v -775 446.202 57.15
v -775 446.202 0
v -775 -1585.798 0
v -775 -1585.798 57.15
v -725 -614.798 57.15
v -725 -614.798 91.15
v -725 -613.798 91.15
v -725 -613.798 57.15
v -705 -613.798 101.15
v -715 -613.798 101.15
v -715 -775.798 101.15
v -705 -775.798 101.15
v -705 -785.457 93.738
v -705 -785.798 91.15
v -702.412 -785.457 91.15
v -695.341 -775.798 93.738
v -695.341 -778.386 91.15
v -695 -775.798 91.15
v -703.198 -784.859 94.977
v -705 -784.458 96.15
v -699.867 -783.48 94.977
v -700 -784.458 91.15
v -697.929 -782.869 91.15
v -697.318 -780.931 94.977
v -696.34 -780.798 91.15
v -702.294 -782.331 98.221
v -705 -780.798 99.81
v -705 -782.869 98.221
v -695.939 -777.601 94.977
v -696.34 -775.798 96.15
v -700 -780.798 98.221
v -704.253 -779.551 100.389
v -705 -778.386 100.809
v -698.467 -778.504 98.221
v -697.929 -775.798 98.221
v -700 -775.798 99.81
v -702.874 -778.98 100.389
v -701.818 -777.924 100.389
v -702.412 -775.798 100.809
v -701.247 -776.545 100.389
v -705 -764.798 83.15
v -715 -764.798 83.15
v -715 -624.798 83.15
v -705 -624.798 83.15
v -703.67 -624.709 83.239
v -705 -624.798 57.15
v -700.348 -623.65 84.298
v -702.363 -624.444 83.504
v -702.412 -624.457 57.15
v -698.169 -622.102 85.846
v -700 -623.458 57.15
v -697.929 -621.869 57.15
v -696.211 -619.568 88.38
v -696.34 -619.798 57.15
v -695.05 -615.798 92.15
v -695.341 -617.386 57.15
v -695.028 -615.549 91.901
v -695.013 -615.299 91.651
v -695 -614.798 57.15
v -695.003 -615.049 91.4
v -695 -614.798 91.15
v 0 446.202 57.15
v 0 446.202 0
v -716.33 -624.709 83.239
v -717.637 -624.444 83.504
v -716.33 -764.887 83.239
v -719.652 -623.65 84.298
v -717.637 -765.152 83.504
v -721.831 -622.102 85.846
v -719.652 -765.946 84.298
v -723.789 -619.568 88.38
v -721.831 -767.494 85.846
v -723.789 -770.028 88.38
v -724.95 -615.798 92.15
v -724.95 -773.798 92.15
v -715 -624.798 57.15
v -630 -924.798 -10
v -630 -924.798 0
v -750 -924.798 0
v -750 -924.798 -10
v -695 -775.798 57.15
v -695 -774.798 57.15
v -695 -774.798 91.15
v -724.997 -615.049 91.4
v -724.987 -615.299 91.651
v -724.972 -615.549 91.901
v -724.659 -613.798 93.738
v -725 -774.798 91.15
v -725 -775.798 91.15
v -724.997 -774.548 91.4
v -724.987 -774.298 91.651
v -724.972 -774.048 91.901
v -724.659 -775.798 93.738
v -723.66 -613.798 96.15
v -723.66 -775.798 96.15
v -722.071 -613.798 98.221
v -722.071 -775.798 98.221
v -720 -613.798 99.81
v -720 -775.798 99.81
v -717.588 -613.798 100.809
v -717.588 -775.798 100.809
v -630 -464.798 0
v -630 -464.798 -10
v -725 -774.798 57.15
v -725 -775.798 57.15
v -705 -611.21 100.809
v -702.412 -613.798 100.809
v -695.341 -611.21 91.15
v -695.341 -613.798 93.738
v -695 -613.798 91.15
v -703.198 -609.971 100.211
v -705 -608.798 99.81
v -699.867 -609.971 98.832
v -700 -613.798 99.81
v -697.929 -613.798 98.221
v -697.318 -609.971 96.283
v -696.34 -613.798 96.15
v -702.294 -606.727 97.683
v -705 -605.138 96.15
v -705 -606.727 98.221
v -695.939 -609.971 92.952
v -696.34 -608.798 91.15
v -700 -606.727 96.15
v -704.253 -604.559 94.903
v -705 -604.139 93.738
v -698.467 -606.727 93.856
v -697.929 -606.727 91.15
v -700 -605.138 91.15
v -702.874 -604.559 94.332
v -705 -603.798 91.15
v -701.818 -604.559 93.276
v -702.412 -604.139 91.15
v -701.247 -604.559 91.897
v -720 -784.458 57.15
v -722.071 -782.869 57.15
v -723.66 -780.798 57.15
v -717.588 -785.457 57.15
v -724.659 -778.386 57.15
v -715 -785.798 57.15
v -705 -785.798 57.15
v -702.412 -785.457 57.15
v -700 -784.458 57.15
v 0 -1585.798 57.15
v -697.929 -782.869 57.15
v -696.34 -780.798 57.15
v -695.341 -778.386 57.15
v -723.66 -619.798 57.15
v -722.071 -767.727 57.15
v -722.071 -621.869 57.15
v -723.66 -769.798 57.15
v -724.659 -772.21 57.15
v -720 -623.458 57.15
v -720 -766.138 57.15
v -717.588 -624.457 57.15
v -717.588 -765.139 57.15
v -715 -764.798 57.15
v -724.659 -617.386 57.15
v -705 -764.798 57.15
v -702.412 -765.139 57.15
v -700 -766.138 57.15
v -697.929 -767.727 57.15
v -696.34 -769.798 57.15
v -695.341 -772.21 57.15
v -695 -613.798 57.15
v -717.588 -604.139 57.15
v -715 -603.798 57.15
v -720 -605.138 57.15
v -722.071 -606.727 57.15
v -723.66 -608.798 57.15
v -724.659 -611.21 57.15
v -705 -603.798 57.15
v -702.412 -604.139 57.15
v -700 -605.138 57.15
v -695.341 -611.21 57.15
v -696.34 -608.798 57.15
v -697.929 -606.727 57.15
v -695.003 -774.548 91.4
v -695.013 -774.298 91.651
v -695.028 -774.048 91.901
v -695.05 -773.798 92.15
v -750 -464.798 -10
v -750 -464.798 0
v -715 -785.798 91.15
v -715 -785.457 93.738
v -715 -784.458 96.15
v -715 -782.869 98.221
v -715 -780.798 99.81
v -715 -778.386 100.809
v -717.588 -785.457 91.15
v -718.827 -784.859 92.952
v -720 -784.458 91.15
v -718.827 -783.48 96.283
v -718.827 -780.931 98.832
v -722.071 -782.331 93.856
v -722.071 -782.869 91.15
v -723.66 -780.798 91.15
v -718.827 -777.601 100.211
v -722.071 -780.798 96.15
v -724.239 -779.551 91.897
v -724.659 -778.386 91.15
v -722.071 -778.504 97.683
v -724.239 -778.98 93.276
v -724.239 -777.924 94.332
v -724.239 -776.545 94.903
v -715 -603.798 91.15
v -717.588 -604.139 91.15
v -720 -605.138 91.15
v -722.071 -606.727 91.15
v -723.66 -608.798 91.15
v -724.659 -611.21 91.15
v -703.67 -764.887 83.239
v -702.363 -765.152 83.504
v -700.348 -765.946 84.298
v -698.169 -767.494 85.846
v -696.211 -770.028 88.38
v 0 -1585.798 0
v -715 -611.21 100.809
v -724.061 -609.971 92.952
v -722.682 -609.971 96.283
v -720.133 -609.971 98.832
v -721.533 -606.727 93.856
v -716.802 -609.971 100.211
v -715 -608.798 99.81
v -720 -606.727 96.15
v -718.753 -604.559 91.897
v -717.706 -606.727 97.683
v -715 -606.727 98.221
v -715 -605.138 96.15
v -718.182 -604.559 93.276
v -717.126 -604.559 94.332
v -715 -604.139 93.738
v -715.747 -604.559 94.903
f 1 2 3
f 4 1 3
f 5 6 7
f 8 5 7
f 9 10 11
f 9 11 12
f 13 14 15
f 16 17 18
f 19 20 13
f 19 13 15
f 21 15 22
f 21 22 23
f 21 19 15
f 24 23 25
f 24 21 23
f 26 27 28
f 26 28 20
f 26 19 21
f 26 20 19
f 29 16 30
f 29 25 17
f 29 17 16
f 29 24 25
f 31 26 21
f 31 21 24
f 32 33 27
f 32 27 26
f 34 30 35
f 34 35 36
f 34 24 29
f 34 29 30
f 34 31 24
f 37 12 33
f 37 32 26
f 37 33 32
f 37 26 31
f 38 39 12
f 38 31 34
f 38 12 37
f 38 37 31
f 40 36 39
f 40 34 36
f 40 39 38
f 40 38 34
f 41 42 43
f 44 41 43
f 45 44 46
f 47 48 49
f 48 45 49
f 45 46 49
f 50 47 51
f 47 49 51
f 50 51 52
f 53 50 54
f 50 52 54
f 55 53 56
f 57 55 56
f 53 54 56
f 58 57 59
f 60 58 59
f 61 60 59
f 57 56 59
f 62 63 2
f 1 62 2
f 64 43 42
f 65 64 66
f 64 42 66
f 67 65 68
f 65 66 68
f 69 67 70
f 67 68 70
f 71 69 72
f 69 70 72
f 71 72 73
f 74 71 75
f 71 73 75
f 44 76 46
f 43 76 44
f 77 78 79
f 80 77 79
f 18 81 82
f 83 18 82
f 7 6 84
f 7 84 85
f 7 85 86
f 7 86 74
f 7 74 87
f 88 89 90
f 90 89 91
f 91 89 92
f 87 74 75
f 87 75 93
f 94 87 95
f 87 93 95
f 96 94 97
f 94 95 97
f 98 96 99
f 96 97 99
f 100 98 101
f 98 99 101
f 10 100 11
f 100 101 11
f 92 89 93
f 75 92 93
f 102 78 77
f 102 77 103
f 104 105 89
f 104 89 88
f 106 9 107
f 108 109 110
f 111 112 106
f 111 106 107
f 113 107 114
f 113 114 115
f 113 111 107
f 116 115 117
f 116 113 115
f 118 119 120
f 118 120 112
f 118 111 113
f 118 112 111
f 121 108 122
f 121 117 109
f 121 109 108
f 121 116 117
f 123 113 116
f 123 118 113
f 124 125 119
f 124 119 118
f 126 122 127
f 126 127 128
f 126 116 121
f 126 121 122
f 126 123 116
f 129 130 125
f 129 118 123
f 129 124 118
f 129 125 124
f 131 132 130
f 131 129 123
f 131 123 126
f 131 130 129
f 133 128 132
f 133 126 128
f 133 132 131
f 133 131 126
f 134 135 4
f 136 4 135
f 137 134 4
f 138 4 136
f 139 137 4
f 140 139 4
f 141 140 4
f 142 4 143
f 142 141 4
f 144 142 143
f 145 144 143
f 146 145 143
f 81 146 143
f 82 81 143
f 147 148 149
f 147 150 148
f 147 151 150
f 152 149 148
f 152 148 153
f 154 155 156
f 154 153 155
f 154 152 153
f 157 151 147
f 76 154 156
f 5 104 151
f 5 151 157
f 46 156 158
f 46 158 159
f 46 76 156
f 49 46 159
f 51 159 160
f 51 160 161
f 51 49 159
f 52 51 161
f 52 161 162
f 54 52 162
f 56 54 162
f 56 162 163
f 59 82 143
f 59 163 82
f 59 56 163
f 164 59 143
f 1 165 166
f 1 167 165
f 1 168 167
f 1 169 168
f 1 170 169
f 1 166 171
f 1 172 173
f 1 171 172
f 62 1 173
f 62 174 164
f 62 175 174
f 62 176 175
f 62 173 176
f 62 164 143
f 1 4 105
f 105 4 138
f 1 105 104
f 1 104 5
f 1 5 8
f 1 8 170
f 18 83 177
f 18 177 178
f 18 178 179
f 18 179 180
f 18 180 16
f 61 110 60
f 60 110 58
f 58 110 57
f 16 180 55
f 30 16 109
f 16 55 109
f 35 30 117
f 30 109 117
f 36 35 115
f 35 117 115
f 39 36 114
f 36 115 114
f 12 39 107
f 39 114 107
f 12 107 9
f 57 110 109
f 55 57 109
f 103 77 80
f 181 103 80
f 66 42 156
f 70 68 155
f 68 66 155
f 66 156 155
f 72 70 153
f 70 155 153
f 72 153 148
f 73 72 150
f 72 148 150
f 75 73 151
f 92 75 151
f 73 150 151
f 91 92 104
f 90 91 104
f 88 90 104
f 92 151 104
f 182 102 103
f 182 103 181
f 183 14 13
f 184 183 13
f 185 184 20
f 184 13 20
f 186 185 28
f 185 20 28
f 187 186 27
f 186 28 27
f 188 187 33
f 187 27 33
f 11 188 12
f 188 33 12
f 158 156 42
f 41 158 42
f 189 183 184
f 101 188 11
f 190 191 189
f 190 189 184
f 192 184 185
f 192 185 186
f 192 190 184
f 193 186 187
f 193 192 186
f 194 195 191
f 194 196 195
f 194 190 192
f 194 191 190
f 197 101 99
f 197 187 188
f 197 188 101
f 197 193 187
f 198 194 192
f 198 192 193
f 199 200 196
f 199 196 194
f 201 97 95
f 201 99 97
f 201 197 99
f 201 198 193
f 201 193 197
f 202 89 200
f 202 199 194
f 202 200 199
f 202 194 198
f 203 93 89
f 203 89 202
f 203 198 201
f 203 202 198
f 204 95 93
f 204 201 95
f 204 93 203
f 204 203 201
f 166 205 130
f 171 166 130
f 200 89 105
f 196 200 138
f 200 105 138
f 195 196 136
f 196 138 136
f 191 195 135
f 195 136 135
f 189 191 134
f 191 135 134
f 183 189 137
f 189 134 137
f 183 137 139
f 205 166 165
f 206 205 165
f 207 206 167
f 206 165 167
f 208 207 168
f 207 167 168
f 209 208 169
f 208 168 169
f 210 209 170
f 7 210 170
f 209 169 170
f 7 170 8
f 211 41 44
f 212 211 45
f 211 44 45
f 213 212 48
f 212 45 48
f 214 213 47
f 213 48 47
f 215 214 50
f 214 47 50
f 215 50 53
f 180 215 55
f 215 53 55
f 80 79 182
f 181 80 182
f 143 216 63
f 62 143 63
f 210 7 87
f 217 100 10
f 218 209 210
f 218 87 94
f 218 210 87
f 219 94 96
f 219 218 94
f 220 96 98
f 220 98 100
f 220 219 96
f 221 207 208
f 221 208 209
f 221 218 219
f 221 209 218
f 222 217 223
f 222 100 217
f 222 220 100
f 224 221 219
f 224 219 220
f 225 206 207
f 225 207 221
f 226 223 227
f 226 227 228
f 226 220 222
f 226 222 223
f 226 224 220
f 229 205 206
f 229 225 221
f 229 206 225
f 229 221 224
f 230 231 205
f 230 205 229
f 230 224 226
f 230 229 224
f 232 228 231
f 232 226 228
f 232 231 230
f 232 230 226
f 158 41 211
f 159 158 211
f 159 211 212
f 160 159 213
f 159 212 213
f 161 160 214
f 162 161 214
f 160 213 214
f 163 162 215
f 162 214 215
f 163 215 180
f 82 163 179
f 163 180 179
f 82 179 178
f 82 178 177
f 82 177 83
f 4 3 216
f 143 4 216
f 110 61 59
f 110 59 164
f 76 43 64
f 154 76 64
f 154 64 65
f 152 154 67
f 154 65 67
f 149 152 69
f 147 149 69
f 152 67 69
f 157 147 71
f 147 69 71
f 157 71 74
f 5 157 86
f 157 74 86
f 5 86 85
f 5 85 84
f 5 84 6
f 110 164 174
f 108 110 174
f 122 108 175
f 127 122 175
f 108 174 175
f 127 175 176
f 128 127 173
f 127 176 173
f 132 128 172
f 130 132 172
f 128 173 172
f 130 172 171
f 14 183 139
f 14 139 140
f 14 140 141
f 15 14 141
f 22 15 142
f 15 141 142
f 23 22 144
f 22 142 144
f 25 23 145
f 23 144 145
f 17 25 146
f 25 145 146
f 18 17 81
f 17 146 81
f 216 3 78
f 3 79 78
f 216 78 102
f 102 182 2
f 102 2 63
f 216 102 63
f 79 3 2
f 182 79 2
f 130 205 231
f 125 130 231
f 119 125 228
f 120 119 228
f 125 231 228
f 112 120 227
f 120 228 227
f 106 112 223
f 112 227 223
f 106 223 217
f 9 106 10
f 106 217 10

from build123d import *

# Parameters (mm, degrees)
BOSS_EXTRUDE2_DEPTH = 57.15
SKETCH4_W           = 30
SKETCH4_H           = 182
BOSS_EXTRUDE3_DEPTH = 44
SKETCH5_W           = 26
SKETCH5_H           = 140
CUT_EXTRUDE1_DEPTH  = 57.15
FILLET1_R           = 10
SKETCH6_W           = 120
SKETCH6_H           = 460
BOSS_EXTRUDE4_DEPTH = 10


with BuildPart() as part:
    # Sketch1 → Boss-Extrude2 (new body)
    with BuildSketch(Plane.XY):
        Polygon((0, 0), (0, 446.201837212), (-775, 446.201837212), (-775, -1585.798162788), (0, -1585.798162788), align=None)
    extrude(amount=BOSS_EXTRUDE2_DEPTH)

    # Sketch4 → Boss-Extrude3 (add)
    with BuildSketch(Plane.XY.offset(57.15)):
        with Locations((-710, -694.798162788)):
            Rectangle(SKETCH4_W, SKETCH4_H)
    extrude(amount=BOSS_EXTRUDE3_DEPTH)

    # Sketch5 → Cut-Extrude1 (cut)
    with BuildSketch(Plane.ZY.offset(725)):
        with Locations((70.15, -694.798162788)):
            Rectangle(SKETCH5_W, SKETCH5_H)
    extrude(amount=-CUT_EXTRUDE1_DEPTH, mode=Mode.SUBTRACT)

    # Fillet1
    # the kernel refuses this fillet: 10 mm, written as the material it takes off along each edge
    with BuildSketch(Plane(origin=(-715, -613.798162788, 91.15), x_dir=(-1, 0, 0), z_dir=(0, 1, 0))) as fillet1_piece_1_section:
        Polygon((0, 0), (FILLET1_R * 1.02, 0), (FILLET1_R * 1.02, FILLET1_R * 1.02), (0, FILLET1_R * 1.02), align=None)
    fillet1_piece_1 = extrude(amount=FILLET1_R * 1.02, mode=Mode.PRIVATE)
    fillet1_piece_1 = fillet1_piece_1 - Plane(origin=(-715, -613.798162788, 91.15), x_dir=(0.7071067811865475, 0, -0.7071067811865475), z_dir=(0, 1, 0)) * Sphere(FILLET1_R, mode=Mode.PRIVATE)
    add(fillet1_piece_1, mode=Mode.SUBTRACT)
    with BuildSketch(Plane(origin=(-715, -775.798162788, 91.15), x_dir=(0, 0, 1), z_dir=(-1, 0, 0))) as fillet1_piece_2_section:
        Polygon((0, 0), (FILLET1_R * 1.02, 0), (FILLET1_R * 1.02, -FILLET1_R * 1.02), (0, -FILLET1_R * 1.02), align=None)
    fillet1_piece_2 = extrude(amount=FILLET1_R * 1.02, mode=Mode.PRIVATE)
    fillet1_piece_2 = fillet1_piece_2 - Plane(origin=(-715, -775.798162788, 91.15), x_dir=(0, 0.7071067811865475, -0.7071067811865475), z_dir=(-1, 0, 0)) * Sphere(FILLET1_R, mode=Mode.PRIVATE)
    add(fillet1_piece_2, mode=Mode.SUBTRACT)
    with BuildSketch(Plane(origin=(-705, -775.798162788, 91.15), x_dir=(0, -1, 0), z_dir=(0, 0, 1))) as fillet1_piece_3_section:
        Polygon((0, 0), (FILLET1_R * 1.02, 0), (FILLET1_R * 1.02, FILLET1_R * 1.02), (0, FILLET1_R * 1.02), align=None)
    fillet1_piece_3 = extrude(amount=FILLET1_R * 1.02, mode=Mode.PRIVATE)
    fillet1_piece_3 = fillet1_piece_3 - Plane(origin=(-705, -775.798162788, 91.15), x_dir=(-0.7071067811865472, 0.7071067811865477, 0), z_dir=(0, 0, 1)) * Sphere(FILLET1_R, mode=Mode.PRIVATE)
    add(fillet1_piece_3, mode=Mode.SUBTRACT)
    with BuildSketch(Plane(origin=(-705, -613.798162788, 91.15), x_dir=(0, 0, 1), z_dir=(0, 1, 0))) as fillet1_piece_4_section:
        Polygon((0, 0), (FILLET1_R * 1.02, 0), (FILLET1_R * 1.02, FILLET1_R * 1.02), (0, FILLET1_R * 1.02), align=None)
    fillet1_piece_4 = extrude(amount=FILLET1_R * 1.02, mode=Mode.PRIVATE)
    fillet1_piece_4 = fillet1_piece_4 - Plane(origin=(-705, -613.798162788, 91.15), x_dir=(-0.7071067811865475, 0, -0.7071067811865475), z_dir=(0, 1, 0)) * Sphere(FILLET1_R, mode=Mode.PRIVATE)
    add(fillet1_piece_4, mode=Mode.SUBTRACT)
    with BuildSketch(Plane(origin=(-725, -603.798162788, 57.15), x_dir=(1, 0, 0), z_dir=(0, 0, 1)), Plane(origin=(-695, -785.798162788, 57.15), x_dir=(-1, 0, 0), z_dir=(0, 0, 1)), Plane(origin=(-695, -603.798162788, 57.15), x_dir=(0, -1, 0), z_dir=(0, 0, 1))) as fillet1_piece_5:
        with BuildLine():
            CenterArc((FILLET1_R, -FILLET1_R), FILLET1_R, 90, 90)
            Line((0, -FILLET1_R), (-FILLET1_R * 0.02, -FILLET1_R))
            Line((-FILLET1_R * 0.02, -FILLET1_R), (-FILLET1_R * 0.02, FILLET1_R * 0.02))
            Line((-FILLET1_R * 0.02, FILLET1_R * 0.02), (FILLET1_R, FILLET1_R * 0.02))
            Line((FILLET1_R, FILLET1_R * 0.02), (FILLET1_R, 0))
        make_face()
    extrude(amount=34, mode=Mode.SUBTRACT)
    with BuildSketch(Plane(origin=(-725, -785.798162788, 57.15), x_dir=(1, 0, 0), z_dir=(0, 0, 1))) as fillet1_piece_6:
        with BuildLine():
            CenterArc((FILLET1_R, FILLET1_R), FILLET1_R, 180, 90)
            Line((0, FILLET1_R), (-FILLET1_R * 0.02, FILLET1_R))
            Line((-FILLET1_R * 0.02, FILLET1_R), (-FILLET1_R * 0.02, -FILLET1_R * 0.02))
            Line((-FILLET1_R * 0.02, -FILLET1_R * 0.02), (FILLET1_R, -FILLET1_R * 0.02))
            Line((FILLET1_R, -FILLET1_R * 0.02), (FILLET1_R, 0))
        make_face()
    extrude(amount=34, mode=Mode.SUBTRACT)
    with BuildSketch(Plane(origin=(-725, -775.798162788, 101.15), x_dir=(0, 0, -1), z_dir=(0, 1, 0)), Plane(origin=(-695, -613.798162788, 101.15), x_dir=(0, 0, -1), z_dir=(0, -1, 0))) as fillet1_piece_7:
        with BuildLine():
            CenterArc((FILLET1_R, -FILLET1_R), FILLET1_R, 90, 90)
            Line((0, -FILLET1_R), (-FILLET1_R * 0.02, -FILLET1_R))
            Line((-FILLET1_R * 0.02, -FILLET1_R), (-FILLET1_R * 0.02, FILLET1_R * 0.02))
            Line((-FILLET1_R * 0.02, FILLET1_R * 0.02), (FILLET1_R, FILLET1_R * 0.02))
            Line((FILLET1_R, FILLET1_R * 0.02), (FILLET1_R, 0))
        make_face()
    extrude(amount=162, mode=Mode.SUBTRACT)
    with BuildSketch(Plane(origin=(-705, -785.798162788, 101.15), x_dir=(0, 0, -1), z_dir=(-1, 0, 0)), Plane(origin=(-715, -603.798162788, 101.15), x_dir=(0, 0, -1), z_dir=(1, 0, 0))) as fillet1_piece_8:
        with BuildLine():
            CenterArc((FILLET1_R, -FILLET1_R), FILLET1_R, 90, 90)
            Line((0, -FILLET1_R), (-FILLET1_R * 0.02, -FILLET1_R))
            Line((-FILLET1_R * 0.02, -FILLET1_R), (-FILLET1_R * 0.02, FILLET1_R * 0.02))
            Line((-FILLET1_R * 0.02, FILLET1_R * 0.02), (FILLET1_R, FILLET1_R * 0.02))
            Line((FILLET1_R, FILLET1_R * 0.02), (FILLET1_R, 0))
        make_face()
    extrude(amount=10, mode=Mode.SUBTRACT)
    with BuildSketch(Plane(origin=(-695, -764.798162788, 83.15), x_dir=(0, -1, 0), z_dir=(0, 0, -1)), Plane(origin=(-695, -624.798162788, 57.15), x_dir=(0, 1, 0), z_dir=(0, 0, 1)), Plane(origin=(-725, -764.798162788, 57.15), x_dir=(0, -1, 0), z_dir=(0, 0, 1)), Plane(origin=(-725, -624.798162788, 83.15), x_dir=(0, 1, 0), z_dir=(0, 0, -1))) as fillet1_piece_9:
        with BuildLine():
            CenterArc((FILLET1_R, FILLET1_R), FILLET1_R, 180, 90)
            Line((0, FILLET1_R), (-FILLET1_R * 0.02, FILLET1_R))
            Line((-FILLET1_R * 0.02, FILLET1_R), (-FILLET1_R * 0.02, -FILLET1_R * 0.02))
            Line((-FILLET1_R * 0.02, -FILLET1_R * 0.02), (FILLET1_R, -FILLET1_R * 0.02))
            Line((FILLET1_R, -FILLET1_R * 0.02), (FILLET1_R, 0))
        make_face()
    extrude(amount=26, mode=Mode.SUBTRACT)
    with BuildSketch(Plane(origin=(-695, -624.798162788, 83.15), x_dir=(0, 0, 1), z_dir=(0, -1, 0)), Plane(origin=(-725, -764.798162788, 83.15), x_dir=(0, 0, 1), z_dir=(0, 1, 0))) as fillet1_piece_10:
        with BuildLine():
            CenterArc((FILLET1_R, FILLET1_R), FILLET1_R, 180, 90)
            Line((0, FILLET1_R), (-FILLET1_R * 0.02, FILLET1_R))
            Line((-FILLET1_R * 0.02, FILLET1_R), (-FILLET1_R * 0.02, -FILLET1_R * 0.02))
            Line((-FILLET1_R * 0.02, -FILLET1_R * 0.02), (FILLET1_R, -FILLET1_R * 0.02))
            Line((FILLET1_R, -FILLET1_R * 0.02), (FILLET1_R, 0))
        make_face()
    extrude(amount=140, mode=Mode.SUBTRACT)
    with BuildSketch(Plane(origin=(-695, -624.798162788, 83.15), x_dir=(0, 0, 1), z_dir=(0, -1, 0))) as fillet1_piece_11a_section:
        with BuildLine():
            CenterArc((FILLET1_R, FILLET1_R), FILLET1_R, 180, 90)
            Line((0, FILLET1_R), (-FILLET1_R * 0.02, FILLET1_R))
            Line((-FILLET1_R * 0.02, FILLET1_R), (-FILLET1_R * 0.02, -FILLET1_R * 0.02))
            Line((-FILLET1_R * 0.02, -FILLET1_R * 0.02), (FILLET1_R, -FILLET1_R * 0.02))
            Line((FILLET1_R, -FILLET1_R * 0.02), (FILLET1_R, 0))
        make_face()
    fillet1_piece_11a = extrude(amount=165, mode=Mode.PRIVATE)
    fillet1_piece_11a = split(fillet1_piece_11a, bisect_by=Plane(origin=(-697.263951143, -764.798162788, 85.413951143), z_dir=(0, -1, 0)), keep=Keep.TOP, mode=Mode.PRIVATE)
    with BuildSketch(Plane(origin=(-695, -764.798162788, 108.15), x_dir=(0, -1, 0), z_dir=(0, 0, -1))) as fillet1_piece_11b_section:
        with BuildLine():
            CenterArc((FILLET1_R, FILLET1_R), FILLET1_R, 180, 90)
            Line((0, FILLET1_R), (-FILLET1_R * 0.02, FILLET1_R))
            Line((-FILLET1_R * 0.02, FILLET1_R), (-FILLET1_R * 0.02, -FILLET1_R * 0.02))
            Line((-FILLET1_R * 0.02, -FILLET1_R * 0.02), (FILLET1_R, -FILLET1_R * 0.02))
            Line((FILLET1_R, -FILLET1_R * 0.02), (FILLET1_R, 0))
        make_face()
    fillet1_piece_11b = extrude(amount=51, mode=Mode.PRIVATE)
    fillet1_piece_11b = split(fillet1_piece_11b, bisect_by=Plane(origin=(-697.263951143, -767.062113931, 83.15), z_dir=(0, 0, 1)), keep=Keep.TOP, mode=Mode.PRIVATE)
    fillet1_piece_11 = fillet1_piece_11a & fillet1_piece_11b
    add(fillet1_piece_11, mode=Mode.SUBTRACT)
    with BuildSketch(Plane(origin=(-695, -624.798162788, 57.15), x_dir=(0, 1, 0), z_dir=(0, 0, 1))) as fillet1_piece_12a_section:
        with BuildLine():
            CenterArc((FILLET1_R, FILLET1_R), FILLET1_R, 180, 90)
            Line((0, FILLET1_R), (-FILLET1_R * 0.02, FILLET1_R))
            Line((-FILLET1_R * 0.02, FILLET1_R), (-FILLET1_R * 0.02, -FILLET1_R * 0.02))
            Line((-FILLET1_R * 0.02, -FILLET1_R * 0.02), (FILLET1_R, -FILLET1_R * 0.02))
            Line((FILLET1_R, -FILLET1_R * 0.02), (FILLET1_R, 0))
        make_face()
    fillet1_piece_12a = extrude(amount=51, mode=Mode.PRIVATE)
    fillet1_piece_12a = split(fillet1_piece_12a, bisect_by=Plane(origin=(-697.263951143, -622.534211645, 83.15), z_dir=(0, 0, 1)), keep=Keep.TOP, mode=Mode.PRIVATE)
    with BuildSketch(Plane(origin=(-695, -599.798162788, 83.15), x_dir=(0, 0, 1), z_dir=(0, -1, 0))) as fillet1_piece_12b_section:
        with BuildLine():
            CenterArc((FILLET1_R, FILLET1_R), FILLET1_R, 180, 90)
            Line((0, FILLET1_R), (-FILLET1_R * 0.02, FILLET1_R))
            Line((-FILLET1_R * 0.02, FILLET1_R), (-FILLET1_R * 0.02, -FILLET1_R * 0.02))
            Line((-FILLET1_R * 0.02, -FILLET1_R * 0.02), (FILLET1_R, -FILLET1_R * 0.02))
            Line((FILLET1_R, -FILLET1_R * 0.02), (FILLET1_R, 0))
        make_face()
    fillet1_piece_12b = extrude(amount=165, mode=Mode.PRIVATE)
    fillet1_piece_12b = split(fillet1_piece_12b, bisect_by=Plane(origin=(-697.263951143, -624.798162788, 85.413951143), z_dir=(0, 1, 0)), keep=Keep.TOP, mode=Mode.PRIVATE)
    fillet1_piece_12 = fillet1_piece_12a & fillet1_piece_12b
    add(fillet1_piece_12, mode=Mode.SUBTRACT)
    with BuildSketch(Plane(origin=(-725, -764.798162788, 57.15), x_dir=(0, -1, 0), z_dir=(0, 0, 1))) as fillet1_piece_13a_section:
        with BuildLine():
            CenterArc((FILLET1_R, FILLET1_R), FILLET1_R, 180, 90)
            Line((0, FILLET1_R), (-FILLET1_R * 0.02, FILLET1_R))
            Line((-FILLET1_R * 0.02, FILLET1_R), (-FILLET1_R * 0.02, -FILLET1_R * 0.02))
            Line((-FILLET1_R * 0.02, -FILLET1_R * 0.02), (FILLET1_R, -FILLET1_R * 0.02))
            Line((FILLET1_R, -FILLET1_R * 0.02), (FILLET1_R, 0))
        make_face()
    fillet1_piece_13a = extrude(amount=51, mode=Mode.PRIVATE)
    fillet1_piece_13a = split(fillet1_piece_13a, bisect_by=Plane(origin=(-722.736048857, -767.062113931, 83.15), z_dir=(0, 0, 1)), keep=Keep.TOP, mode=Mode.PRIVATE)
    with BuildSketch(Plane(origin=(-725, -789.798162788, 83.15), x_dir=(0, 0, 1), z_dir=(0, 1, 0))) as fillet1_piece_13b_section:
        with BuildLine():
            CenterArc((FILLET1_R, FILLET1_R), FILLET1_R, 180, 90)
            Line((0, FILLET1_R), (-FILLET1_R * 0.02, FILLET1_R))
            Line((-FILLET1_R * 0.02, FILLET1_R), (-FILLET1_R * 0.02, -FILLET1_R * 0.02))
            Line((-FILLET1_R * 0.02, -FILLET1_R * 0.02), (FILLET1_R, -FILLET1_R * 0.02))
            Line((FILLET1_R, -FILLET1_R * 0.02), (FILLET1_R, 0))
        make_face()
    fillet1_piece_13b = extrude(amount=165, mode=Mode.PRIVATE)
    fillet1_piece_13b = split(fillet1_piece_13b, bisect_by=Plane(origin=(-722.736048857, -764.798162788, 85.413951143), z_dir=(0, -1, 0)), keep=Keep.TOP, mode=Mode.PRIVATE)
    fillet1_piece_13 = fillet1_piece_13a & fillet1_piece_13b
    add(fillet1_piece_13, mode=Mode.SUBTRACT)
    with BuildSketch(Plane(origin=(-725, -764.798162788, 83.15), x_dir=(0, 0, 1), z_dir=(0, 1, 0))) as fillet1_piece_14a_section:
        with BuildLine():
            CenterArc((FILLET1_R, FILLET1_R), FILLET1_R, 180, 90)
            Line((0, FILLET1_R), (-FILLET1_R * 0.02, FILLET1_R))
            Line((-FILLET1_R * 0.02, FILLET1_R), (-FILLET1_R * 0.02, -FILLET1_R * 0.02))
            Line((-FILLET1_R * 0.02, -FILLET1_R * 0.02), (FILLET1_R, -FILLET1_R * 0.02))
            Line((FILLET1_R, -FILLET1_R * 0.02), (FILLET1_R, 0))
        make_face()
    fillet1_piece_14a = extrude(amount=165, mode=Mode.PRIVATE)
    fillet1_piece_14a = split(fillet1_piece_14a, bisect_by=Plane(origin=(-722.736048857, -624.798162788, 85.413951143), z_dir=(0, 1, 0)), keep=Keep.TOP, mode=Mode.PRIVATE)
    with BuildSketch(Plane(origin=(-725, -624.798162788, 108.15), x_dir=(0, 1, 0), z_dir=(0, 0, -1))) as fillet1_piece_14b_section:
        with BuildLine():
            CenterArc((FILLET1_R, FILLET1_R), FILLET1_R, 180, 90)
            Line((0, FILLET1_R), (-FILLET1_R * 0.02, FILLET1_R))
            Line((-FILLET1_R * 0.02, FILLET1_R), (-FILLET1_R * 0.02, -FILLET1_R * 0.02))
            Line((-FILLET1_R * 0.02, -FILLET1_R * 0.02), (FILLET1_R, -FILLET1_R * 0.02))
            Line((FILLET1_R, -FILLET1_R * 0.02), (FILLET1_R, 0))
        make_face()
    fillet1_piece_14b = extrude(amount=51, mode=Mode.PRIVATE)
    fillet1_piece_14b = split(fillet1_piece_14b, bisect_by=Plane(origin=(-722.736048857, -622.534211645, 83.15), z_dir=(0, 0, 1)), keep=Keep.TOP, mode=Mode.PRIVATE)
    fillet1_piece_14 = fillet1_piece_14a & fillet1_piece_14b
    add(fillet1_piece_14, mode=Mode.SUBTRACT)

    # Sketch6 → Boss-Extrude4 (add)
    with BuildSketch(Plane(origin=(0, 0, 0), x_dir=(-1, 0, 0), z_dir=(0, 0, -1))):
        with Locations((690, -694.798162788)):
            Rectangle(SKETCH6_W, SKETCH6_H)
    extrude(amount=BOSS_EXTRUDE4_DEPTH)


solid = part.part
